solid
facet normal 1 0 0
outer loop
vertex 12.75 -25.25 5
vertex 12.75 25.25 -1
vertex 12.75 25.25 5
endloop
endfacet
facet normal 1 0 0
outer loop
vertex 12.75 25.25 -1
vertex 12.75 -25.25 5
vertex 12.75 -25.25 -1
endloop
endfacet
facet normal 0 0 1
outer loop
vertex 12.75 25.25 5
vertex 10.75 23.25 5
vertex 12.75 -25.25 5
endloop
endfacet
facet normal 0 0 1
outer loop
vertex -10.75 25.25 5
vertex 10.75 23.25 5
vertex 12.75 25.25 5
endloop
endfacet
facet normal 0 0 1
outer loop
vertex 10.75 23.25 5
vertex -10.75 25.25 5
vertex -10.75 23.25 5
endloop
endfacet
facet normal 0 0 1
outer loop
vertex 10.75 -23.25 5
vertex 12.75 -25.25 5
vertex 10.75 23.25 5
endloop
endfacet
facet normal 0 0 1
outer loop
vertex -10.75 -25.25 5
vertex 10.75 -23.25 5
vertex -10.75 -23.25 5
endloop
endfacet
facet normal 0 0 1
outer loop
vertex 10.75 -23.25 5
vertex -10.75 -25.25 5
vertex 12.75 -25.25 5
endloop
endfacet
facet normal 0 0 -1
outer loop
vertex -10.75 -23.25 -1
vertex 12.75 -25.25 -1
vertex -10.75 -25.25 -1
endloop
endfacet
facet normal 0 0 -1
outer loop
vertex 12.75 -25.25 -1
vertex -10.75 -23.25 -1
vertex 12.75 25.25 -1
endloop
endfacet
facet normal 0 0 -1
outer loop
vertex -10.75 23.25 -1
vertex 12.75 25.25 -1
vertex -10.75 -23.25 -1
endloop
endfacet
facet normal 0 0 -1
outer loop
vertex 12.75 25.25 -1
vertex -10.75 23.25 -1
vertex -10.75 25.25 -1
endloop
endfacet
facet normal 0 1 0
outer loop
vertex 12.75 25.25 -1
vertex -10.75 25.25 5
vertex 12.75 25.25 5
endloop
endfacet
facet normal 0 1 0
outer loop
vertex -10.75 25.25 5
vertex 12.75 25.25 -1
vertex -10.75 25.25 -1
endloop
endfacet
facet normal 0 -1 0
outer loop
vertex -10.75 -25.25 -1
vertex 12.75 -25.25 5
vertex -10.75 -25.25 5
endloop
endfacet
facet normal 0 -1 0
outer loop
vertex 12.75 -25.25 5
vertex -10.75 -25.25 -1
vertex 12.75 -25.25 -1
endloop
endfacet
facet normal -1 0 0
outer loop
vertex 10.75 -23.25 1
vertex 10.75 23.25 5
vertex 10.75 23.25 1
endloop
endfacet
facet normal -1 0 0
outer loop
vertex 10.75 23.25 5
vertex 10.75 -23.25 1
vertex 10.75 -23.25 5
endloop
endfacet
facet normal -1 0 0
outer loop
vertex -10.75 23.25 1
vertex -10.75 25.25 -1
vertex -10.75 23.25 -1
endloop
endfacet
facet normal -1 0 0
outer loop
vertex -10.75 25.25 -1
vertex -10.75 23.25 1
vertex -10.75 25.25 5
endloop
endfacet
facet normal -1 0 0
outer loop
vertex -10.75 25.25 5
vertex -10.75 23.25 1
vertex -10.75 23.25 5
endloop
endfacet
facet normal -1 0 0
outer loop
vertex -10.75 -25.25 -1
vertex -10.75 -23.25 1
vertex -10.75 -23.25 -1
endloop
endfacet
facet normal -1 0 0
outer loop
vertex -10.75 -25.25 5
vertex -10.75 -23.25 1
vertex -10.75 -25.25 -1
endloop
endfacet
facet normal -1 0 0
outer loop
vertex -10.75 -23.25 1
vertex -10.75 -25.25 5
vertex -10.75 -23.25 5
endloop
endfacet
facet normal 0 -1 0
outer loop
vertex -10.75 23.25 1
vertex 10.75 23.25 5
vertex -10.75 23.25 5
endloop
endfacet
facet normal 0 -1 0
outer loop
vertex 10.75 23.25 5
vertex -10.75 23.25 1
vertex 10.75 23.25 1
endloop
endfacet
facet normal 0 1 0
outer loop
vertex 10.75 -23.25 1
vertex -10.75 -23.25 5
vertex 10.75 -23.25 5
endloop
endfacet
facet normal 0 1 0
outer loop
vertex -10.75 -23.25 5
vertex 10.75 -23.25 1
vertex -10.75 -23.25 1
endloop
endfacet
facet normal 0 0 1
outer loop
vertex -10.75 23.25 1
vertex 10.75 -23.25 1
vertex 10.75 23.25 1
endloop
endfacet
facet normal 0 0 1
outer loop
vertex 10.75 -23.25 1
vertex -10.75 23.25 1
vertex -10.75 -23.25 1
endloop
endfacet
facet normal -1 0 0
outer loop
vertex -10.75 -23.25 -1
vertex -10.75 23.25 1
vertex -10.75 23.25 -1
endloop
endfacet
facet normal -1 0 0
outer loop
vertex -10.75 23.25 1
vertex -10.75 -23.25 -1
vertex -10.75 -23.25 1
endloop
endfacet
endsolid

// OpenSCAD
w_back = 70;
h_back = 45;
w_controller = 20;
thickness_bottom = 2;

h_walls = 4;
thickness_walls = 2;
gap_backlight = 1.5;

kit_controller();
//walls();

// debug_controller();

module debug_controller() {
    difference() {
        kit_controller();
        translate([-w_controller/2, 0, h_walls/2])
        cube([w_controller, h_back+2*thickness_walls+gap_backlight+1, 2*h_walls], center=true);
    }
}

module kit_controller() {
    controller();
    translate([0, 0, h_walls/2])
    walls();
}

module walls() {
    difference() {
        cube([w_controller+2*thickness_walls+gap_backlight, h_back+2*thickness_walls+gap_backlight, thickness_bottom+h_walls], center=true);
        color("red")
        cube([w_controller+gap_backlight, h_back+gap_backlight, thickness_bottom+h_walls+1], center=true);
        translate([-w_controller-thickness_walls+gap_backlight/2-0.25, 0, 0])
        cube([w_controller+gap_backlight, h_back+gap_backlight+2*+thickness_walls + 1, thickness_bottom+h_walls+1], center=true);
    }
}

module controller() {
    cube([w_controller+gap_backlight, h_back+gap_backlight, thickness_bottom], center=true);
}
